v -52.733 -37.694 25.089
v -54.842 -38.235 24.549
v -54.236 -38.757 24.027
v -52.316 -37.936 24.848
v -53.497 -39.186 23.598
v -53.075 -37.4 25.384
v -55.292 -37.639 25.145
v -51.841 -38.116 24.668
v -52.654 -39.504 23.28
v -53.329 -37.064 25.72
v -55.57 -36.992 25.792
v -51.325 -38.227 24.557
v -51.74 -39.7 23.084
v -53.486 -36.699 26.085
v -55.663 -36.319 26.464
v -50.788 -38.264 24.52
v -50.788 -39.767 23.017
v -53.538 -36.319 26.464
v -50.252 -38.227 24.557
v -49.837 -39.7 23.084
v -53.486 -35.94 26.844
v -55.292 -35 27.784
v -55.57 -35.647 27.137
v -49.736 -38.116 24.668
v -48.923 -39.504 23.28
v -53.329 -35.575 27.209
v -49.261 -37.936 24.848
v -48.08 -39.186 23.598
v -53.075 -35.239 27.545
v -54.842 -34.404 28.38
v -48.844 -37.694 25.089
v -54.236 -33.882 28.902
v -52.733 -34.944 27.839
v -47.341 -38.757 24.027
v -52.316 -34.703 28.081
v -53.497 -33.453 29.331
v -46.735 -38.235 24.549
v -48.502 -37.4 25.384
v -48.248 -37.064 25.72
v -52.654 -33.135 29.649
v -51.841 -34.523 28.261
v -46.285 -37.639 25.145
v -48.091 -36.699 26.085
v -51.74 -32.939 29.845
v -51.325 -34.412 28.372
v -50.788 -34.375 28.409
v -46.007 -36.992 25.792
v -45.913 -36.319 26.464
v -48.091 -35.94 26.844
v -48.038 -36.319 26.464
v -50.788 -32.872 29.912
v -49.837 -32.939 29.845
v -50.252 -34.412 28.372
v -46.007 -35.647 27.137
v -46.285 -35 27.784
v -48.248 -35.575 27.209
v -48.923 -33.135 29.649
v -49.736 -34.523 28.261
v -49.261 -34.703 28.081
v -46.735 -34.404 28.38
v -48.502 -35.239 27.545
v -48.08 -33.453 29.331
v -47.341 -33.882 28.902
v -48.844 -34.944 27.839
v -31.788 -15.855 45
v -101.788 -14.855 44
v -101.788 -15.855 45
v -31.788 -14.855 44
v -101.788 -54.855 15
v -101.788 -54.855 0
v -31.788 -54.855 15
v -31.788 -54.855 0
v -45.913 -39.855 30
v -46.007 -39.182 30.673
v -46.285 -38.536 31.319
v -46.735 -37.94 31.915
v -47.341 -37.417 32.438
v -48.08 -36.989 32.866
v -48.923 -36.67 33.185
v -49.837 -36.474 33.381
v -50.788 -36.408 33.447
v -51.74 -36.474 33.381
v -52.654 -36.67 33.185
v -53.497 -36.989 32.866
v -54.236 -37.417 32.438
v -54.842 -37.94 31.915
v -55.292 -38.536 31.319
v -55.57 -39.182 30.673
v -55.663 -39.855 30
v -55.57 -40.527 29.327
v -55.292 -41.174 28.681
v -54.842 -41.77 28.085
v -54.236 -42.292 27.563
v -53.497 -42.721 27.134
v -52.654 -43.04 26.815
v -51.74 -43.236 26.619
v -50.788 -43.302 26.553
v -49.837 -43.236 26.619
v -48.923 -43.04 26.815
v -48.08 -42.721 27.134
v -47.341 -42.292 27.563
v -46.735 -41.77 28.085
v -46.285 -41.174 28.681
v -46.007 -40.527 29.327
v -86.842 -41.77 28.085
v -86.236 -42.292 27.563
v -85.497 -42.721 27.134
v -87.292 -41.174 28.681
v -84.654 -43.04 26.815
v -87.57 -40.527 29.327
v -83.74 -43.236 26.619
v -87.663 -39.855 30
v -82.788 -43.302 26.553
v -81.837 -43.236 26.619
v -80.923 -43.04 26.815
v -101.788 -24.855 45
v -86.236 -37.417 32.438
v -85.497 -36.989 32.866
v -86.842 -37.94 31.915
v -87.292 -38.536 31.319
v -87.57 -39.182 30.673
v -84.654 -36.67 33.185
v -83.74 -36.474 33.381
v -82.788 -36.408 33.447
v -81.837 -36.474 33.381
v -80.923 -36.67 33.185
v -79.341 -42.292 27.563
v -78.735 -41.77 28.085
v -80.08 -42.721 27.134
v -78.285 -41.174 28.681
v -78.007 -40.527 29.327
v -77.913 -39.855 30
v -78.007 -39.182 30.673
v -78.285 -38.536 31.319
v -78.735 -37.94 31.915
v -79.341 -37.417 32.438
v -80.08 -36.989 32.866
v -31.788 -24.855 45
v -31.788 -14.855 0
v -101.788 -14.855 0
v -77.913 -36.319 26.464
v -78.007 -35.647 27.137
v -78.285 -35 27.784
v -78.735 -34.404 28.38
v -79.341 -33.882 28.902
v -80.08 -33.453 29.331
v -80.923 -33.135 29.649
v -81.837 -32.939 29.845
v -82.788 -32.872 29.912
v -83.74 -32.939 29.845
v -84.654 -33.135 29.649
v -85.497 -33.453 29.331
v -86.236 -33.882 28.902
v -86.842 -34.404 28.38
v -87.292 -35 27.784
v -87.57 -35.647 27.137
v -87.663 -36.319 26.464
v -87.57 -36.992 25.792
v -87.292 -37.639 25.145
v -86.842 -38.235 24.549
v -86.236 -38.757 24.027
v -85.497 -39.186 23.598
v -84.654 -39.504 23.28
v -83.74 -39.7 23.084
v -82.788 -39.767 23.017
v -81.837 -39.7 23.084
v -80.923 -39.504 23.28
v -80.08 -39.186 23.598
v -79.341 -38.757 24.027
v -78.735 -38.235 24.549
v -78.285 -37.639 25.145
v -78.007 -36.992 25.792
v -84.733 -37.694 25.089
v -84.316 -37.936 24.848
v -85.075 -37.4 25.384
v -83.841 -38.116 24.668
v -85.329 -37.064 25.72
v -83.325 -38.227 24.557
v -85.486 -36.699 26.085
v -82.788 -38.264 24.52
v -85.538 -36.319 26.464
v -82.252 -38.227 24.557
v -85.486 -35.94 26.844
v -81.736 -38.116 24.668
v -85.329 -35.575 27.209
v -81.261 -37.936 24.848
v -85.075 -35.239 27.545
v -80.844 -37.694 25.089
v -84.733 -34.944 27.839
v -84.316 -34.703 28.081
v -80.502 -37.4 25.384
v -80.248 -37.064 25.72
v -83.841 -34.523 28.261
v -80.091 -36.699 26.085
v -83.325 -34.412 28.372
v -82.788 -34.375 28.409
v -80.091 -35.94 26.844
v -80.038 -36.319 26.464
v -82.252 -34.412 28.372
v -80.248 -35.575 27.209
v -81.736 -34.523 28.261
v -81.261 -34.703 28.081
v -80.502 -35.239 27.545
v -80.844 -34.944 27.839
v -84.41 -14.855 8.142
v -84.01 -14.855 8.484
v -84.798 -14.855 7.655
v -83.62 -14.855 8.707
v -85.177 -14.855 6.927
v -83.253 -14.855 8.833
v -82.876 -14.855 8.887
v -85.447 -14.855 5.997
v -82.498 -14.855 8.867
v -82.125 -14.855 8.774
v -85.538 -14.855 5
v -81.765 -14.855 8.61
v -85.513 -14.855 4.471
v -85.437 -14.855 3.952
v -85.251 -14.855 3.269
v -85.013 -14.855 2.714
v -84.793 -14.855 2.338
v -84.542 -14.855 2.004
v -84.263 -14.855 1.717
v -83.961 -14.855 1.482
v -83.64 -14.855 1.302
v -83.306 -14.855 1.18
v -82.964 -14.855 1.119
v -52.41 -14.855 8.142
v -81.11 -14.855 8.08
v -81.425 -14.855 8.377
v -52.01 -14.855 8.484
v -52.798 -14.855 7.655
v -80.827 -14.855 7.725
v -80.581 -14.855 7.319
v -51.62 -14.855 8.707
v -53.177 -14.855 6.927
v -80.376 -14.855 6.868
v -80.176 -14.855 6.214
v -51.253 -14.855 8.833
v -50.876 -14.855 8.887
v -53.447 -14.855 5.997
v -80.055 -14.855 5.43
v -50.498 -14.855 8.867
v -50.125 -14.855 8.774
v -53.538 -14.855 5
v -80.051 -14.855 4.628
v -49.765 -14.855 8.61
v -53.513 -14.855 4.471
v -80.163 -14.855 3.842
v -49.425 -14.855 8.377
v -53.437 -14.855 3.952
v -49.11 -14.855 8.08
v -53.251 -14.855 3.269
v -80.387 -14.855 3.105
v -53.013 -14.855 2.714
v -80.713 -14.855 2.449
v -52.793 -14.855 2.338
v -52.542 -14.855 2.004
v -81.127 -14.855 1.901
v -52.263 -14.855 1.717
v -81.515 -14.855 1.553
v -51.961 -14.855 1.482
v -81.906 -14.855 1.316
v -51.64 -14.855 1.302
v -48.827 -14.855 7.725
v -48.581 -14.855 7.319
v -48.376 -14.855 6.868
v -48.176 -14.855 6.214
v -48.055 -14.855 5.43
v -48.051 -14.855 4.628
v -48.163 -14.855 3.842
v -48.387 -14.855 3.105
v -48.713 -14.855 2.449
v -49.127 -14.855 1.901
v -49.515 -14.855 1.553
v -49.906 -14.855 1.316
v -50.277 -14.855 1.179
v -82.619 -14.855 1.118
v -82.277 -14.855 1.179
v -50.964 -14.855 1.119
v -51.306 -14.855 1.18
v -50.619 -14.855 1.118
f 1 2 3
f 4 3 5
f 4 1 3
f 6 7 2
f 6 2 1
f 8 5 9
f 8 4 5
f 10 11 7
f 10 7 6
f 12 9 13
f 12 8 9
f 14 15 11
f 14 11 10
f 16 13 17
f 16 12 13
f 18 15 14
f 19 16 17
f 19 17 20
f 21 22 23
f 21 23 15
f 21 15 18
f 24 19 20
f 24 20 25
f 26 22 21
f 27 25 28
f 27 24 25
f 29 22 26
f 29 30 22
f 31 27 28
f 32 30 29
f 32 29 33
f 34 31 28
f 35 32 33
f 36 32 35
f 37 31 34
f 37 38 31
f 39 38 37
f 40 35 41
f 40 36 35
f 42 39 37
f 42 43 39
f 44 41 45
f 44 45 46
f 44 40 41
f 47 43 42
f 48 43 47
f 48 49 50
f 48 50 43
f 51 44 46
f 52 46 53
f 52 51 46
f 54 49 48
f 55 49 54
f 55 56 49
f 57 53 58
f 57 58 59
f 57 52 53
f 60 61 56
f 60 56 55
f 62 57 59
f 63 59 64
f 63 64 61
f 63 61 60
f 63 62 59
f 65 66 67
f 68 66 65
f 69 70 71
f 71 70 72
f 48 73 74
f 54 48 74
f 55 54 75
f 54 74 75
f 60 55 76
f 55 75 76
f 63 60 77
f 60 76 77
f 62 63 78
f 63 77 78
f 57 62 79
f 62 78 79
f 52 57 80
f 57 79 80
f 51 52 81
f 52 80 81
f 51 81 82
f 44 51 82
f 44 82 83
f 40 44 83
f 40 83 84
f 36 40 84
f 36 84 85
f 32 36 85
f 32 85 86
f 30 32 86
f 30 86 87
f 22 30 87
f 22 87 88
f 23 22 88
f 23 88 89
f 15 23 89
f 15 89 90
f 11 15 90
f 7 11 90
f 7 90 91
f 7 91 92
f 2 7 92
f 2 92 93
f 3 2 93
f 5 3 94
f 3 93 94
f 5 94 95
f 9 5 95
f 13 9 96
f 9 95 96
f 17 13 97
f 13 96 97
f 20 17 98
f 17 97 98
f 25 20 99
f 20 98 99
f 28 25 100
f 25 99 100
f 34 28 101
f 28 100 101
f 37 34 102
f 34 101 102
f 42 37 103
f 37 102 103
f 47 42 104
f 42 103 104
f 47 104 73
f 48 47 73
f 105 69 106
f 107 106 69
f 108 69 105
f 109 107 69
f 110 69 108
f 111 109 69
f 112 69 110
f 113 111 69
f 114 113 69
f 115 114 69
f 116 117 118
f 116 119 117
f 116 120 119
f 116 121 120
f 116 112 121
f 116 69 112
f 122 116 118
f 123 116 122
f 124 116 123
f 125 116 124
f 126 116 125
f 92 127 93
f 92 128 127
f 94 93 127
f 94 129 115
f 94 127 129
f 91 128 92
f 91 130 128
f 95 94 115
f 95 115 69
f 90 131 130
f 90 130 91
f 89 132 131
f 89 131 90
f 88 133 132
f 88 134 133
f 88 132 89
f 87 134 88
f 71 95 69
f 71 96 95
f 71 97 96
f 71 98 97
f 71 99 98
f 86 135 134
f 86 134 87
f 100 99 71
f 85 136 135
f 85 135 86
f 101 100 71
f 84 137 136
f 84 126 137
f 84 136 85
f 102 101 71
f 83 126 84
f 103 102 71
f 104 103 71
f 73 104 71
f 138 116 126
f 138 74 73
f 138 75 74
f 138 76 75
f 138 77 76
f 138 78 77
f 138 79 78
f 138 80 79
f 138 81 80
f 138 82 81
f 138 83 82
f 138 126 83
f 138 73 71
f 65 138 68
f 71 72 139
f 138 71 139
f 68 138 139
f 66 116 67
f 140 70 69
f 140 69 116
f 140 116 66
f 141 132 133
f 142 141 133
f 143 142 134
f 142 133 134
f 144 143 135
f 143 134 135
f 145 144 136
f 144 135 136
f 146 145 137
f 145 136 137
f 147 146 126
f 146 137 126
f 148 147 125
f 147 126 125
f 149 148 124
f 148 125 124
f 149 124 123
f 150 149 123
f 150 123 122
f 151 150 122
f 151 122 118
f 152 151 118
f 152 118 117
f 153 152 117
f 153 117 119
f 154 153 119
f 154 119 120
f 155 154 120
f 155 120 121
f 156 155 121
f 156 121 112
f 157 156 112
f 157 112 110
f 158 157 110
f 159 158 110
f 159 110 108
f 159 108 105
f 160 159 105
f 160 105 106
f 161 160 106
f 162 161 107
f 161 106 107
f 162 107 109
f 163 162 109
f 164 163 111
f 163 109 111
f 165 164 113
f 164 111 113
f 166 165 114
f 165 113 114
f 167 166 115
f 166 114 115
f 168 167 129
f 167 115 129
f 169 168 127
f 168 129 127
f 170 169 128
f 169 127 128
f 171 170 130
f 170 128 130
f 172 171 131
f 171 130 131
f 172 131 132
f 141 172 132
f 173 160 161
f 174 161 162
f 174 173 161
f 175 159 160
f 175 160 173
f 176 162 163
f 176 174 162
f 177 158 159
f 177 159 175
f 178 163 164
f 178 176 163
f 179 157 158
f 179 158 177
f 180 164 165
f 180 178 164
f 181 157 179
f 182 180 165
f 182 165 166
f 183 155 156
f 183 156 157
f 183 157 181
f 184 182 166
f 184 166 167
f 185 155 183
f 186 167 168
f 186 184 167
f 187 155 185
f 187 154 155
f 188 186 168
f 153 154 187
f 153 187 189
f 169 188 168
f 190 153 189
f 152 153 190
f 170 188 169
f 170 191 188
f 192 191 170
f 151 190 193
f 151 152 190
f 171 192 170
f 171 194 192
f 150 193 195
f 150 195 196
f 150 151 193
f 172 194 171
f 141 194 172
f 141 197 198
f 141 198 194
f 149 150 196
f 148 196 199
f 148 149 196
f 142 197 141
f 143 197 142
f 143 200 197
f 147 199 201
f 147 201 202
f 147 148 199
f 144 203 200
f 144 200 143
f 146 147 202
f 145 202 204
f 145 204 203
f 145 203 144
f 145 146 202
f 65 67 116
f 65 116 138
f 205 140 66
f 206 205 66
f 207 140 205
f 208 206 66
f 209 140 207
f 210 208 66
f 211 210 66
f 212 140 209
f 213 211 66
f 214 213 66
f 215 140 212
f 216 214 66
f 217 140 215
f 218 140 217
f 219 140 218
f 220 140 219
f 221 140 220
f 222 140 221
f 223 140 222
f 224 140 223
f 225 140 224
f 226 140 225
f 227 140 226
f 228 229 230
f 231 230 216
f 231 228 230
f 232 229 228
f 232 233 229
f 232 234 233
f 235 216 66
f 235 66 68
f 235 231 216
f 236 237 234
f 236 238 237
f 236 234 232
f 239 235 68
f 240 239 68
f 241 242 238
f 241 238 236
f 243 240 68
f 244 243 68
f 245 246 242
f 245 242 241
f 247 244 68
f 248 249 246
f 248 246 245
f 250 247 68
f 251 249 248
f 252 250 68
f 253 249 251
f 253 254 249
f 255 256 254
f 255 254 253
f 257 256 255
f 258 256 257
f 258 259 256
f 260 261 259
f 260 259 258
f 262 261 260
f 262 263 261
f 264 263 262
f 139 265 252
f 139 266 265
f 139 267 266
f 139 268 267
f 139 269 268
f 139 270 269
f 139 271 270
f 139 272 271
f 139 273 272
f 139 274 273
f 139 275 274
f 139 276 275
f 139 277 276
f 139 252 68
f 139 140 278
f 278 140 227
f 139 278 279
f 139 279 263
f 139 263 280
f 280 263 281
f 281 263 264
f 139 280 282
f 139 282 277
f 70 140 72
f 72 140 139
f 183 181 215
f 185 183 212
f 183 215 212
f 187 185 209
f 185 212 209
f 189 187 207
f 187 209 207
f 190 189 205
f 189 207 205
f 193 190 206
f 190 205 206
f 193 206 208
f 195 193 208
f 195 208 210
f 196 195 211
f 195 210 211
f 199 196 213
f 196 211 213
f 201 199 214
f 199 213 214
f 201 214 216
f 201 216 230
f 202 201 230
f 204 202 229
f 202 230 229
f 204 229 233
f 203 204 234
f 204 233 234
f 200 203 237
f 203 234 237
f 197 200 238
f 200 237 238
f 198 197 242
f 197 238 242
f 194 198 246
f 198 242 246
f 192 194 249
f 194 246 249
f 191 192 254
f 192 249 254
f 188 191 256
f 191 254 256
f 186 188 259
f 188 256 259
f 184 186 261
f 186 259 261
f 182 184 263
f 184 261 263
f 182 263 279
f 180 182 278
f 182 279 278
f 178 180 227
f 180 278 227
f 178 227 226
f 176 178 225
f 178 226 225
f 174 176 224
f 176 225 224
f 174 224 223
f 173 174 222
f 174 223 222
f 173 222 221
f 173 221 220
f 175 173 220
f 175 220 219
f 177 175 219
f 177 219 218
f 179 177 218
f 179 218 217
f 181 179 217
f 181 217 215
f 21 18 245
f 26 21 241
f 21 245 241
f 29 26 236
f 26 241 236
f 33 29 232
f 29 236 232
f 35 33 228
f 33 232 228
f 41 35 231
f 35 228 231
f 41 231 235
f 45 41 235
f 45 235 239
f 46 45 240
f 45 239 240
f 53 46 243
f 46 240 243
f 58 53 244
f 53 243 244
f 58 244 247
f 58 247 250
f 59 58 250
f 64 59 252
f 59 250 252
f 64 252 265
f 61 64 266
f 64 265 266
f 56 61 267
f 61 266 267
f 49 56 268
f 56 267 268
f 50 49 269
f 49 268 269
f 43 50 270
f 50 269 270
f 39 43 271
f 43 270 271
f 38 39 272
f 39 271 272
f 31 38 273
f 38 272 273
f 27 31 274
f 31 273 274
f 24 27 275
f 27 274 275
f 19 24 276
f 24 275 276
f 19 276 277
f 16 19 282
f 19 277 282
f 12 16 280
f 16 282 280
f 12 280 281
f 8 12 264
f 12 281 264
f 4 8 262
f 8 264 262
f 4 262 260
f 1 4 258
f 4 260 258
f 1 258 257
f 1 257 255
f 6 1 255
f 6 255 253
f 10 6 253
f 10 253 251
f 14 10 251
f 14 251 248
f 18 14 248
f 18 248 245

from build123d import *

# Parameters (mm, degrees)
F0_W           = 70
F0_H           = 40
F1_DEPTH       = 45
F2_SIZE        = 30
F4_D           = 5.5
F4_CBORE_D     = 9.75
F4_CBORE_DEPTH = 5
F5_SIZE        = 1


with BuildPart() as f1:
    # F0 (on Top) → F1 (new body)
    with BuildSketch(Plane.XY):
        with Locations((-66.7884647846, -34.8549866823)):
            Rectangle(F0_W, F0_H)
    extrude(amount=F1_DEPTH)

    # F2
    f2_edges = [f1.edges().sort_by_distance(p)[0] for p in [
        (-66.788465, -54.854987, 45),
    ]]
    chamfer(f2_edges, length=F2_SIZE)

    # F4 (through all)
    with Locations(Plane(origin=(0, -34.9274933411, 34.9274933411), x_dir=(1, 0, 0), z_dir=(0, -0.7071067812, 0.7071067812))):
        with Locations((-82.7884647846, -6.9685279115), (-50.7884647846, -6.9685279115)):
            CounterBoreHole(F4_D / 2, F4_CBORE_D / 2, F4_CBORE_DEPTH)

    # F5
    f5_edges = [f1.edges().sort_by_distance(p)[0] for p in [
        (-66.788465, -14.854987, 45),
    ]]
    chamfer(f5_edges, length=F5_SIZE)


solid = f1.part
